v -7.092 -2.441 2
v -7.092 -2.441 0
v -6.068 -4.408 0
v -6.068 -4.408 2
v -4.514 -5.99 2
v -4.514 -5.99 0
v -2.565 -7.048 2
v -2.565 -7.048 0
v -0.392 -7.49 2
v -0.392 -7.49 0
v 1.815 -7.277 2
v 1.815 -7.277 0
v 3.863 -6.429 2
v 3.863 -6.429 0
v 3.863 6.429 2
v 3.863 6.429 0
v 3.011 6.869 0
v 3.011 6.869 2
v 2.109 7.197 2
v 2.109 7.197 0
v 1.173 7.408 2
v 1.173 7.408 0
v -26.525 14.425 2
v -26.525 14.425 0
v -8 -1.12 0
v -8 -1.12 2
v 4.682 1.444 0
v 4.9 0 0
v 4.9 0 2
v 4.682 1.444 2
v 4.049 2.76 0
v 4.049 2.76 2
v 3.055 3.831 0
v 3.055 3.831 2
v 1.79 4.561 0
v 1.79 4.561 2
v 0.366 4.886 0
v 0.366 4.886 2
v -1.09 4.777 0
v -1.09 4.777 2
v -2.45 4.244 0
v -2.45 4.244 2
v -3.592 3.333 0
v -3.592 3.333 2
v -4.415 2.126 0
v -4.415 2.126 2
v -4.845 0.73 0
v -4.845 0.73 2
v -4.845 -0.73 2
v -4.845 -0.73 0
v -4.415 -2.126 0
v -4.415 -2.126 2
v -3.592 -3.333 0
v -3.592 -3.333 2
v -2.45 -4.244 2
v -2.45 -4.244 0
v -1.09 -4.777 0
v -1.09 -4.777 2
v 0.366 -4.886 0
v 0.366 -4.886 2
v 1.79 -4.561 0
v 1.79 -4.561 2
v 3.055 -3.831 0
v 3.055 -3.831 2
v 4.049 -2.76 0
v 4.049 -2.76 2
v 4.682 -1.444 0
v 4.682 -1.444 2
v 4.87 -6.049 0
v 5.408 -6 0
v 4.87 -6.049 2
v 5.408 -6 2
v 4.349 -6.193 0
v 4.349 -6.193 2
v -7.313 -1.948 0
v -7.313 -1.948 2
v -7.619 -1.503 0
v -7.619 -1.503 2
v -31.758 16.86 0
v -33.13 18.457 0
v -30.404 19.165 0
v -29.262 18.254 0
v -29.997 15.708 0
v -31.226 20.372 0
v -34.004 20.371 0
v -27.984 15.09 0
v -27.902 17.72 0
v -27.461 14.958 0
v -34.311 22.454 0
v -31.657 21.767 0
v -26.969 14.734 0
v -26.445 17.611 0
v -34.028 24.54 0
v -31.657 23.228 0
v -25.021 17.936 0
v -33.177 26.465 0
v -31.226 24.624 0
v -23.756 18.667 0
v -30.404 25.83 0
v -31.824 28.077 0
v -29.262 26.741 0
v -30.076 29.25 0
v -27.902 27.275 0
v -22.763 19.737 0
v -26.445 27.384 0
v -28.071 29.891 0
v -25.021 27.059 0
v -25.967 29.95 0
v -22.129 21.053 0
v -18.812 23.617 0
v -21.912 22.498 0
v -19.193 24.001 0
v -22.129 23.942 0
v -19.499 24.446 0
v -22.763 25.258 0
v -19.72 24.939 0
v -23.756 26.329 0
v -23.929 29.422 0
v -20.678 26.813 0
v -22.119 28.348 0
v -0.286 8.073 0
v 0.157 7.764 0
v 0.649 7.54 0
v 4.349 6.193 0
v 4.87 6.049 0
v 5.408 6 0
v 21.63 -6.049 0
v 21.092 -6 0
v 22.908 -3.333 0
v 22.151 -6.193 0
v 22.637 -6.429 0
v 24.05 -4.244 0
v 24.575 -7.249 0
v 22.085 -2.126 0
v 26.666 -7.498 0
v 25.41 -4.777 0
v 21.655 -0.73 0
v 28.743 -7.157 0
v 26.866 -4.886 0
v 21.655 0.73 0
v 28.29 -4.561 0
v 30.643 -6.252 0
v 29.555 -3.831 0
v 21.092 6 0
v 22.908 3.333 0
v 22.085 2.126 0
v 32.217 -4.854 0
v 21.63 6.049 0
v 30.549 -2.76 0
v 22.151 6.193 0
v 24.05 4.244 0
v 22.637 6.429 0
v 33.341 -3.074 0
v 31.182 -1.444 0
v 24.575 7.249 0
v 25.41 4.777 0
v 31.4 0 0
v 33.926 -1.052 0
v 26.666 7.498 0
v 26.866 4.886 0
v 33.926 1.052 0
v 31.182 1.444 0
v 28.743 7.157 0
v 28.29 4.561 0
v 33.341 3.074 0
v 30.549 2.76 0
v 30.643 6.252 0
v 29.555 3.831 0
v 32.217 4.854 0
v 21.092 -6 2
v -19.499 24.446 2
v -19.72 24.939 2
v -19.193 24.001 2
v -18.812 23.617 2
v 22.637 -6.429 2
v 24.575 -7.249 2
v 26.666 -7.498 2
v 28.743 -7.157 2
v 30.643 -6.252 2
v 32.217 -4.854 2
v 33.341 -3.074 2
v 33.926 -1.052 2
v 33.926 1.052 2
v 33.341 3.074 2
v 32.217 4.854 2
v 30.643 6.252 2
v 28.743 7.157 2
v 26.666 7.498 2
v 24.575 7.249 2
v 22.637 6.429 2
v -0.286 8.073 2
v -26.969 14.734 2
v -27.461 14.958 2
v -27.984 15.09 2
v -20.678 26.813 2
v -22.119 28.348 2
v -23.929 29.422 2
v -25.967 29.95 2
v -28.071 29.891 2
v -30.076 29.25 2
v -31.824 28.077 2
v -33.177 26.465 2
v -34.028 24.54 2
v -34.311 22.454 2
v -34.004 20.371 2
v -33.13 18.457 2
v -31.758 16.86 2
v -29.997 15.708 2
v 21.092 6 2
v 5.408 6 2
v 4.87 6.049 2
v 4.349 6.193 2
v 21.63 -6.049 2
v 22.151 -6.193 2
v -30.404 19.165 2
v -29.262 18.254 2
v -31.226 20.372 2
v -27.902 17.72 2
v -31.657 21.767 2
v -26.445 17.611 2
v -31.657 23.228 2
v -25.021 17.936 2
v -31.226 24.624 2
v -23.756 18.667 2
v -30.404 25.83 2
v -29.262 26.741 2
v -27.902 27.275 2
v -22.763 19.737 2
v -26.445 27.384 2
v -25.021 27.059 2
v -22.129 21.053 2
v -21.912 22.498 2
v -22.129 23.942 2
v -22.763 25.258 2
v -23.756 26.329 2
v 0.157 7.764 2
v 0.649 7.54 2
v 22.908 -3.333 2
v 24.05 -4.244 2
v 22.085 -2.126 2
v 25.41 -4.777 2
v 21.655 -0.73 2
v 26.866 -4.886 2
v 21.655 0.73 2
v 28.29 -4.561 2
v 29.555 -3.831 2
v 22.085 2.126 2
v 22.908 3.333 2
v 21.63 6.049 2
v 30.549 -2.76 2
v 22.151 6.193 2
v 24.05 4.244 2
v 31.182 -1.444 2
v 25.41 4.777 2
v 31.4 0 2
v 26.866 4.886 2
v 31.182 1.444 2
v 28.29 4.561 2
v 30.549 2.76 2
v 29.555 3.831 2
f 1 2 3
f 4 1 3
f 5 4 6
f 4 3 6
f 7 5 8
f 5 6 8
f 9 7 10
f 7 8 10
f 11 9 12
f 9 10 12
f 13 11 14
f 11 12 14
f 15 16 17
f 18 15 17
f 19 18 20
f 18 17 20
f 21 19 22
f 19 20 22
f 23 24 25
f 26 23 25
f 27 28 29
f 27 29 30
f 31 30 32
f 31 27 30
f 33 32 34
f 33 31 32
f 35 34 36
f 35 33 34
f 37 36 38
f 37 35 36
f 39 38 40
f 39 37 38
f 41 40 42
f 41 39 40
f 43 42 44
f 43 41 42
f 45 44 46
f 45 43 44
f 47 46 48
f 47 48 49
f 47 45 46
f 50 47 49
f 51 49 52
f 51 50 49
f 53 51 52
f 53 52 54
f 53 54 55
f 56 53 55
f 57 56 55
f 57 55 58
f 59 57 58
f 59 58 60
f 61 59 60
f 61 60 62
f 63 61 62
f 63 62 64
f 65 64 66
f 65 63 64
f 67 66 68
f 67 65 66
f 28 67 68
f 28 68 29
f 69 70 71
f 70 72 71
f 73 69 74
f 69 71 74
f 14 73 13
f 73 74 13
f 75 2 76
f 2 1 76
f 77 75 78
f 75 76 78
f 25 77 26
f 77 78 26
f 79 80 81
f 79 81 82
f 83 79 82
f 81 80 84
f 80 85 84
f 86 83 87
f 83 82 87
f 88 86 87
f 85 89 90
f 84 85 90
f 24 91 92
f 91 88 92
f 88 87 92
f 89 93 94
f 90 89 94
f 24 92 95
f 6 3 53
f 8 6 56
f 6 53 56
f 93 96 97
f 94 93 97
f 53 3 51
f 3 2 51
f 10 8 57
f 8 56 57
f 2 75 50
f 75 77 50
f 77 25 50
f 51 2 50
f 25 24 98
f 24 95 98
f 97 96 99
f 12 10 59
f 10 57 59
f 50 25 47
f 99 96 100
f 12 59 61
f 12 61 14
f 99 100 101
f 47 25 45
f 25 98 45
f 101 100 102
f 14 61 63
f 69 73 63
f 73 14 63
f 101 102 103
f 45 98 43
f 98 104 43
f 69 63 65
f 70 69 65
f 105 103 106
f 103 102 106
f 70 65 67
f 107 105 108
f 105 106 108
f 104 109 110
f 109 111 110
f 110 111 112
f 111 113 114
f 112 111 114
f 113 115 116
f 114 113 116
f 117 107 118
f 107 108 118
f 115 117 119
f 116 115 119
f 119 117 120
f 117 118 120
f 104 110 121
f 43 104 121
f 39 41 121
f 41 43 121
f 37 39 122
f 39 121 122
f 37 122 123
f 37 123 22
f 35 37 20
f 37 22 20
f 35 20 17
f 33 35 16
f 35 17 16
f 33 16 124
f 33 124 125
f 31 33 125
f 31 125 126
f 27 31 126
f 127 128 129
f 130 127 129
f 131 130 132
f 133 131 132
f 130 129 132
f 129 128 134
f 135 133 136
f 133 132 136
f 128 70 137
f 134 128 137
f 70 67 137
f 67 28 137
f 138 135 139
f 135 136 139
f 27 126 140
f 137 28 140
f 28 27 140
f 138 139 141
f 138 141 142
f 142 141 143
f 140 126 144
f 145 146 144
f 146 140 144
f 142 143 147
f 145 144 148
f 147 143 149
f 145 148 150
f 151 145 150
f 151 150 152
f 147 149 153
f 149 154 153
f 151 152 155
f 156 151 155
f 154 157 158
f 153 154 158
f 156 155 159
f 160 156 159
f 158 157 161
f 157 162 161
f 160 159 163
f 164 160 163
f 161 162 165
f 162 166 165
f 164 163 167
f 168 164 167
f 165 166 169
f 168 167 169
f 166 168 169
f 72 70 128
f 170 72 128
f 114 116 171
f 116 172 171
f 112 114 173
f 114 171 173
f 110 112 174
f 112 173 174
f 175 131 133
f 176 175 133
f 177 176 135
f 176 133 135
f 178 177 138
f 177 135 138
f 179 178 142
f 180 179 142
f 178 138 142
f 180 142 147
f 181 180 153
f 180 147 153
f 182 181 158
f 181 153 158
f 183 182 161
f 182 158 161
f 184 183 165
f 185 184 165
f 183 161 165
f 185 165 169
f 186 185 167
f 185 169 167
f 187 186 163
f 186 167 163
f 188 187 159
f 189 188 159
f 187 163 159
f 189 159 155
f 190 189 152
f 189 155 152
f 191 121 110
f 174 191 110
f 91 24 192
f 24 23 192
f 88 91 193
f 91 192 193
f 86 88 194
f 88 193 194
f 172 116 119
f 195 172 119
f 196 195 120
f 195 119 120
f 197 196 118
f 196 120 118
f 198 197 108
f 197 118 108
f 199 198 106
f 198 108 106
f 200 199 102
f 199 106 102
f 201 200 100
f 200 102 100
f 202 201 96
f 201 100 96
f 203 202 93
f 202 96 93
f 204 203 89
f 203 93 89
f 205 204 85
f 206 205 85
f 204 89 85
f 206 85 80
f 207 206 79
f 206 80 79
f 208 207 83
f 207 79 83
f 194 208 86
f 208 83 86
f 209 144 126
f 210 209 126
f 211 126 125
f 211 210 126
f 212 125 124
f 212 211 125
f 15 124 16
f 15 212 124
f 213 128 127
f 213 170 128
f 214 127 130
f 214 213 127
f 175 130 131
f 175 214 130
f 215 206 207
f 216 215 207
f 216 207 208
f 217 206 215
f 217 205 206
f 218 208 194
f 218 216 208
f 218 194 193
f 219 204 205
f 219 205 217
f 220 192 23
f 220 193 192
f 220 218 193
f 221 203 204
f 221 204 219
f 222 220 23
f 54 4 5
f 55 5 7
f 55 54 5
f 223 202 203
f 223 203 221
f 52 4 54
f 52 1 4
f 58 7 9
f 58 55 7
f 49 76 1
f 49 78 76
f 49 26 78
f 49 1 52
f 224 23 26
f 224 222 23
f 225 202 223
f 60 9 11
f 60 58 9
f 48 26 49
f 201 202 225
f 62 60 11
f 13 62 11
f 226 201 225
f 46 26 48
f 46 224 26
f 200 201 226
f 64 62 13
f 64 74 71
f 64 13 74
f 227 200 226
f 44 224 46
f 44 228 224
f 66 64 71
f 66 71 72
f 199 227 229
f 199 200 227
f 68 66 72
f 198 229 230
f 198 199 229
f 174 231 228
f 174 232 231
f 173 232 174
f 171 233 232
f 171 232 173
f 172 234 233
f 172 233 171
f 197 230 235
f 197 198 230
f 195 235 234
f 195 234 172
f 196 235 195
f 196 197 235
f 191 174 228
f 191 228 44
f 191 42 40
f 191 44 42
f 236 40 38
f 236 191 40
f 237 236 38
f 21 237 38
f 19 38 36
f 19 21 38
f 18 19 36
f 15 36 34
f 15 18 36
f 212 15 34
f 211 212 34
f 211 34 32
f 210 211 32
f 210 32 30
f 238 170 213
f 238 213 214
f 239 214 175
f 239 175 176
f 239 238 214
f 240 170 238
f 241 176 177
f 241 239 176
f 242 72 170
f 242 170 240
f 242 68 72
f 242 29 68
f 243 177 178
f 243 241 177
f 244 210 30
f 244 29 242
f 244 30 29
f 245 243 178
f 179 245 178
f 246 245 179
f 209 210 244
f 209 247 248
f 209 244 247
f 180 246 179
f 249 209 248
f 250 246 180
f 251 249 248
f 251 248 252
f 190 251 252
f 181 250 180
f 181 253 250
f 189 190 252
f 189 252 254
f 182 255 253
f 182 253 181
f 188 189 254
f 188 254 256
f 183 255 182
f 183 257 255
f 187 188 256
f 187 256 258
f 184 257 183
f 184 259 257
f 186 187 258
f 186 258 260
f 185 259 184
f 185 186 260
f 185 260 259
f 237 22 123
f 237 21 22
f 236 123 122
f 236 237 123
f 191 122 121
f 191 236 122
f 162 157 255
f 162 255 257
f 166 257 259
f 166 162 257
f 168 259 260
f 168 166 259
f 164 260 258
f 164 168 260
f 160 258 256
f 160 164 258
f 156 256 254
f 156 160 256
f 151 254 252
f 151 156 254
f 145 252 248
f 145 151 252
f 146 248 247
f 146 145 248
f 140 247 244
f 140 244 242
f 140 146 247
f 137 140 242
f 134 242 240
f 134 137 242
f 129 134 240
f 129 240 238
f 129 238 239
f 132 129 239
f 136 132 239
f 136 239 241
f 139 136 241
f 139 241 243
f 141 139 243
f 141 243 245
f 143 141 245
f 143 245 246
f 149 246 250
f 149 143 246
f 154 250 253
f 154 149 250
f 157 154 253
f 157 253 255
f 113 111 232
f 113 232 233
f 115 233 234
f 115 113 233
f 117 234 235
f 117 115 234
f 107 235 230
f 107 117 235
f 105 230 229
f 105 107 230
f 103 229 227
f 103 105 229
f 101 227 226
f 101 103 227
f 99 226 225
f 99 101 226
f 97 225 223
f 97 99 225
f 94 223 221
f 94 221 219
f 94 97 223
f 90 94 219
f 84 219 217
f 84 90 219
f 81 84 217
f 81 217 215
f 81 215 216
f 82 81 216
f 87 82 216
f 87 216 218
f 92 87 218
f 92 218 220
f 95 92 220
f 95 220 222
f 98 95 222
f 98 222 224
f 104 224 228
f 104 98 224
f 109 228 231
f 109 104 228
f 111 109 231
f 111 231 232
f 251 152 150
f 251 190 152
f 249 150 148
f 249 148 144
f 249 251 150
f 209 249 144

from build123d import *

# Parameters (mm, degrees)
SKETCH1_R           = 4.9
BOSS_EXTRUDE1_DEPTH = 2
FILLET1_R           = 3


with BuildPart() as part:
    # Sketch1 → Boss-Extrude1 (new body)
    with BuildSketch(Plane.XY):
        with BuildLine():
            Line((4.5, -6), (22, -6))
            ThreePointArc((22, -6), (34, 0), (22, 6))
            Line((22, 6), (4.5, 6))
            ThreePointArc((4.5, 6), (2.565151075, 7.047694656), (0.409525664, 7.488810902))
            Line((0.409525664, 7.488810902), (-19.507629857, 24.201288754))
            ThreePointArc((-19.507629857, 24.201288754), (-32.556888833, 27.318473412), (-27.221081173, 15.008755437))
            Line((-27.221081173, 15.008755437), (-7.303925652, -1.703722415))
            ThreePointArc((-7.303925652, -1.703722415), (-2.565151075, -7.047694656), (4.5, -6))
        make_face()
        Circle(SKETCH1_R, mode=Mode.SUBTRACT)
        with Locations((26.5, 0)):
            Circle(SKETCH1_R, mode=Mode.SUBTRACT)
        with Locations((-26.811555509, 22.497566339)):
            Circle(SKETCH1_R, mode=Mode.SUBTRACT)
    extrude(amount=BOSS_EXTRUDE1_DEPTH)

    # Fillet1
    fillet1_edges = [part.edges().sort_by_distance(p)[0] for p in [
        (-19.507629857, 24.201288754, 1),
        (0.409525664, 7.488810902, 1),
        (4.5, 6, 1),
        (22, 6, 1),
        (22, -6, 1),
        (4.5, -6, 1),
        (-7.303925652, -1.703722415, 1),
        (-27.221081173, 15.008755437, 1),
    ]]
    fillet(fillet1_edges, radius=FILLET1_R)


solid = part.part
